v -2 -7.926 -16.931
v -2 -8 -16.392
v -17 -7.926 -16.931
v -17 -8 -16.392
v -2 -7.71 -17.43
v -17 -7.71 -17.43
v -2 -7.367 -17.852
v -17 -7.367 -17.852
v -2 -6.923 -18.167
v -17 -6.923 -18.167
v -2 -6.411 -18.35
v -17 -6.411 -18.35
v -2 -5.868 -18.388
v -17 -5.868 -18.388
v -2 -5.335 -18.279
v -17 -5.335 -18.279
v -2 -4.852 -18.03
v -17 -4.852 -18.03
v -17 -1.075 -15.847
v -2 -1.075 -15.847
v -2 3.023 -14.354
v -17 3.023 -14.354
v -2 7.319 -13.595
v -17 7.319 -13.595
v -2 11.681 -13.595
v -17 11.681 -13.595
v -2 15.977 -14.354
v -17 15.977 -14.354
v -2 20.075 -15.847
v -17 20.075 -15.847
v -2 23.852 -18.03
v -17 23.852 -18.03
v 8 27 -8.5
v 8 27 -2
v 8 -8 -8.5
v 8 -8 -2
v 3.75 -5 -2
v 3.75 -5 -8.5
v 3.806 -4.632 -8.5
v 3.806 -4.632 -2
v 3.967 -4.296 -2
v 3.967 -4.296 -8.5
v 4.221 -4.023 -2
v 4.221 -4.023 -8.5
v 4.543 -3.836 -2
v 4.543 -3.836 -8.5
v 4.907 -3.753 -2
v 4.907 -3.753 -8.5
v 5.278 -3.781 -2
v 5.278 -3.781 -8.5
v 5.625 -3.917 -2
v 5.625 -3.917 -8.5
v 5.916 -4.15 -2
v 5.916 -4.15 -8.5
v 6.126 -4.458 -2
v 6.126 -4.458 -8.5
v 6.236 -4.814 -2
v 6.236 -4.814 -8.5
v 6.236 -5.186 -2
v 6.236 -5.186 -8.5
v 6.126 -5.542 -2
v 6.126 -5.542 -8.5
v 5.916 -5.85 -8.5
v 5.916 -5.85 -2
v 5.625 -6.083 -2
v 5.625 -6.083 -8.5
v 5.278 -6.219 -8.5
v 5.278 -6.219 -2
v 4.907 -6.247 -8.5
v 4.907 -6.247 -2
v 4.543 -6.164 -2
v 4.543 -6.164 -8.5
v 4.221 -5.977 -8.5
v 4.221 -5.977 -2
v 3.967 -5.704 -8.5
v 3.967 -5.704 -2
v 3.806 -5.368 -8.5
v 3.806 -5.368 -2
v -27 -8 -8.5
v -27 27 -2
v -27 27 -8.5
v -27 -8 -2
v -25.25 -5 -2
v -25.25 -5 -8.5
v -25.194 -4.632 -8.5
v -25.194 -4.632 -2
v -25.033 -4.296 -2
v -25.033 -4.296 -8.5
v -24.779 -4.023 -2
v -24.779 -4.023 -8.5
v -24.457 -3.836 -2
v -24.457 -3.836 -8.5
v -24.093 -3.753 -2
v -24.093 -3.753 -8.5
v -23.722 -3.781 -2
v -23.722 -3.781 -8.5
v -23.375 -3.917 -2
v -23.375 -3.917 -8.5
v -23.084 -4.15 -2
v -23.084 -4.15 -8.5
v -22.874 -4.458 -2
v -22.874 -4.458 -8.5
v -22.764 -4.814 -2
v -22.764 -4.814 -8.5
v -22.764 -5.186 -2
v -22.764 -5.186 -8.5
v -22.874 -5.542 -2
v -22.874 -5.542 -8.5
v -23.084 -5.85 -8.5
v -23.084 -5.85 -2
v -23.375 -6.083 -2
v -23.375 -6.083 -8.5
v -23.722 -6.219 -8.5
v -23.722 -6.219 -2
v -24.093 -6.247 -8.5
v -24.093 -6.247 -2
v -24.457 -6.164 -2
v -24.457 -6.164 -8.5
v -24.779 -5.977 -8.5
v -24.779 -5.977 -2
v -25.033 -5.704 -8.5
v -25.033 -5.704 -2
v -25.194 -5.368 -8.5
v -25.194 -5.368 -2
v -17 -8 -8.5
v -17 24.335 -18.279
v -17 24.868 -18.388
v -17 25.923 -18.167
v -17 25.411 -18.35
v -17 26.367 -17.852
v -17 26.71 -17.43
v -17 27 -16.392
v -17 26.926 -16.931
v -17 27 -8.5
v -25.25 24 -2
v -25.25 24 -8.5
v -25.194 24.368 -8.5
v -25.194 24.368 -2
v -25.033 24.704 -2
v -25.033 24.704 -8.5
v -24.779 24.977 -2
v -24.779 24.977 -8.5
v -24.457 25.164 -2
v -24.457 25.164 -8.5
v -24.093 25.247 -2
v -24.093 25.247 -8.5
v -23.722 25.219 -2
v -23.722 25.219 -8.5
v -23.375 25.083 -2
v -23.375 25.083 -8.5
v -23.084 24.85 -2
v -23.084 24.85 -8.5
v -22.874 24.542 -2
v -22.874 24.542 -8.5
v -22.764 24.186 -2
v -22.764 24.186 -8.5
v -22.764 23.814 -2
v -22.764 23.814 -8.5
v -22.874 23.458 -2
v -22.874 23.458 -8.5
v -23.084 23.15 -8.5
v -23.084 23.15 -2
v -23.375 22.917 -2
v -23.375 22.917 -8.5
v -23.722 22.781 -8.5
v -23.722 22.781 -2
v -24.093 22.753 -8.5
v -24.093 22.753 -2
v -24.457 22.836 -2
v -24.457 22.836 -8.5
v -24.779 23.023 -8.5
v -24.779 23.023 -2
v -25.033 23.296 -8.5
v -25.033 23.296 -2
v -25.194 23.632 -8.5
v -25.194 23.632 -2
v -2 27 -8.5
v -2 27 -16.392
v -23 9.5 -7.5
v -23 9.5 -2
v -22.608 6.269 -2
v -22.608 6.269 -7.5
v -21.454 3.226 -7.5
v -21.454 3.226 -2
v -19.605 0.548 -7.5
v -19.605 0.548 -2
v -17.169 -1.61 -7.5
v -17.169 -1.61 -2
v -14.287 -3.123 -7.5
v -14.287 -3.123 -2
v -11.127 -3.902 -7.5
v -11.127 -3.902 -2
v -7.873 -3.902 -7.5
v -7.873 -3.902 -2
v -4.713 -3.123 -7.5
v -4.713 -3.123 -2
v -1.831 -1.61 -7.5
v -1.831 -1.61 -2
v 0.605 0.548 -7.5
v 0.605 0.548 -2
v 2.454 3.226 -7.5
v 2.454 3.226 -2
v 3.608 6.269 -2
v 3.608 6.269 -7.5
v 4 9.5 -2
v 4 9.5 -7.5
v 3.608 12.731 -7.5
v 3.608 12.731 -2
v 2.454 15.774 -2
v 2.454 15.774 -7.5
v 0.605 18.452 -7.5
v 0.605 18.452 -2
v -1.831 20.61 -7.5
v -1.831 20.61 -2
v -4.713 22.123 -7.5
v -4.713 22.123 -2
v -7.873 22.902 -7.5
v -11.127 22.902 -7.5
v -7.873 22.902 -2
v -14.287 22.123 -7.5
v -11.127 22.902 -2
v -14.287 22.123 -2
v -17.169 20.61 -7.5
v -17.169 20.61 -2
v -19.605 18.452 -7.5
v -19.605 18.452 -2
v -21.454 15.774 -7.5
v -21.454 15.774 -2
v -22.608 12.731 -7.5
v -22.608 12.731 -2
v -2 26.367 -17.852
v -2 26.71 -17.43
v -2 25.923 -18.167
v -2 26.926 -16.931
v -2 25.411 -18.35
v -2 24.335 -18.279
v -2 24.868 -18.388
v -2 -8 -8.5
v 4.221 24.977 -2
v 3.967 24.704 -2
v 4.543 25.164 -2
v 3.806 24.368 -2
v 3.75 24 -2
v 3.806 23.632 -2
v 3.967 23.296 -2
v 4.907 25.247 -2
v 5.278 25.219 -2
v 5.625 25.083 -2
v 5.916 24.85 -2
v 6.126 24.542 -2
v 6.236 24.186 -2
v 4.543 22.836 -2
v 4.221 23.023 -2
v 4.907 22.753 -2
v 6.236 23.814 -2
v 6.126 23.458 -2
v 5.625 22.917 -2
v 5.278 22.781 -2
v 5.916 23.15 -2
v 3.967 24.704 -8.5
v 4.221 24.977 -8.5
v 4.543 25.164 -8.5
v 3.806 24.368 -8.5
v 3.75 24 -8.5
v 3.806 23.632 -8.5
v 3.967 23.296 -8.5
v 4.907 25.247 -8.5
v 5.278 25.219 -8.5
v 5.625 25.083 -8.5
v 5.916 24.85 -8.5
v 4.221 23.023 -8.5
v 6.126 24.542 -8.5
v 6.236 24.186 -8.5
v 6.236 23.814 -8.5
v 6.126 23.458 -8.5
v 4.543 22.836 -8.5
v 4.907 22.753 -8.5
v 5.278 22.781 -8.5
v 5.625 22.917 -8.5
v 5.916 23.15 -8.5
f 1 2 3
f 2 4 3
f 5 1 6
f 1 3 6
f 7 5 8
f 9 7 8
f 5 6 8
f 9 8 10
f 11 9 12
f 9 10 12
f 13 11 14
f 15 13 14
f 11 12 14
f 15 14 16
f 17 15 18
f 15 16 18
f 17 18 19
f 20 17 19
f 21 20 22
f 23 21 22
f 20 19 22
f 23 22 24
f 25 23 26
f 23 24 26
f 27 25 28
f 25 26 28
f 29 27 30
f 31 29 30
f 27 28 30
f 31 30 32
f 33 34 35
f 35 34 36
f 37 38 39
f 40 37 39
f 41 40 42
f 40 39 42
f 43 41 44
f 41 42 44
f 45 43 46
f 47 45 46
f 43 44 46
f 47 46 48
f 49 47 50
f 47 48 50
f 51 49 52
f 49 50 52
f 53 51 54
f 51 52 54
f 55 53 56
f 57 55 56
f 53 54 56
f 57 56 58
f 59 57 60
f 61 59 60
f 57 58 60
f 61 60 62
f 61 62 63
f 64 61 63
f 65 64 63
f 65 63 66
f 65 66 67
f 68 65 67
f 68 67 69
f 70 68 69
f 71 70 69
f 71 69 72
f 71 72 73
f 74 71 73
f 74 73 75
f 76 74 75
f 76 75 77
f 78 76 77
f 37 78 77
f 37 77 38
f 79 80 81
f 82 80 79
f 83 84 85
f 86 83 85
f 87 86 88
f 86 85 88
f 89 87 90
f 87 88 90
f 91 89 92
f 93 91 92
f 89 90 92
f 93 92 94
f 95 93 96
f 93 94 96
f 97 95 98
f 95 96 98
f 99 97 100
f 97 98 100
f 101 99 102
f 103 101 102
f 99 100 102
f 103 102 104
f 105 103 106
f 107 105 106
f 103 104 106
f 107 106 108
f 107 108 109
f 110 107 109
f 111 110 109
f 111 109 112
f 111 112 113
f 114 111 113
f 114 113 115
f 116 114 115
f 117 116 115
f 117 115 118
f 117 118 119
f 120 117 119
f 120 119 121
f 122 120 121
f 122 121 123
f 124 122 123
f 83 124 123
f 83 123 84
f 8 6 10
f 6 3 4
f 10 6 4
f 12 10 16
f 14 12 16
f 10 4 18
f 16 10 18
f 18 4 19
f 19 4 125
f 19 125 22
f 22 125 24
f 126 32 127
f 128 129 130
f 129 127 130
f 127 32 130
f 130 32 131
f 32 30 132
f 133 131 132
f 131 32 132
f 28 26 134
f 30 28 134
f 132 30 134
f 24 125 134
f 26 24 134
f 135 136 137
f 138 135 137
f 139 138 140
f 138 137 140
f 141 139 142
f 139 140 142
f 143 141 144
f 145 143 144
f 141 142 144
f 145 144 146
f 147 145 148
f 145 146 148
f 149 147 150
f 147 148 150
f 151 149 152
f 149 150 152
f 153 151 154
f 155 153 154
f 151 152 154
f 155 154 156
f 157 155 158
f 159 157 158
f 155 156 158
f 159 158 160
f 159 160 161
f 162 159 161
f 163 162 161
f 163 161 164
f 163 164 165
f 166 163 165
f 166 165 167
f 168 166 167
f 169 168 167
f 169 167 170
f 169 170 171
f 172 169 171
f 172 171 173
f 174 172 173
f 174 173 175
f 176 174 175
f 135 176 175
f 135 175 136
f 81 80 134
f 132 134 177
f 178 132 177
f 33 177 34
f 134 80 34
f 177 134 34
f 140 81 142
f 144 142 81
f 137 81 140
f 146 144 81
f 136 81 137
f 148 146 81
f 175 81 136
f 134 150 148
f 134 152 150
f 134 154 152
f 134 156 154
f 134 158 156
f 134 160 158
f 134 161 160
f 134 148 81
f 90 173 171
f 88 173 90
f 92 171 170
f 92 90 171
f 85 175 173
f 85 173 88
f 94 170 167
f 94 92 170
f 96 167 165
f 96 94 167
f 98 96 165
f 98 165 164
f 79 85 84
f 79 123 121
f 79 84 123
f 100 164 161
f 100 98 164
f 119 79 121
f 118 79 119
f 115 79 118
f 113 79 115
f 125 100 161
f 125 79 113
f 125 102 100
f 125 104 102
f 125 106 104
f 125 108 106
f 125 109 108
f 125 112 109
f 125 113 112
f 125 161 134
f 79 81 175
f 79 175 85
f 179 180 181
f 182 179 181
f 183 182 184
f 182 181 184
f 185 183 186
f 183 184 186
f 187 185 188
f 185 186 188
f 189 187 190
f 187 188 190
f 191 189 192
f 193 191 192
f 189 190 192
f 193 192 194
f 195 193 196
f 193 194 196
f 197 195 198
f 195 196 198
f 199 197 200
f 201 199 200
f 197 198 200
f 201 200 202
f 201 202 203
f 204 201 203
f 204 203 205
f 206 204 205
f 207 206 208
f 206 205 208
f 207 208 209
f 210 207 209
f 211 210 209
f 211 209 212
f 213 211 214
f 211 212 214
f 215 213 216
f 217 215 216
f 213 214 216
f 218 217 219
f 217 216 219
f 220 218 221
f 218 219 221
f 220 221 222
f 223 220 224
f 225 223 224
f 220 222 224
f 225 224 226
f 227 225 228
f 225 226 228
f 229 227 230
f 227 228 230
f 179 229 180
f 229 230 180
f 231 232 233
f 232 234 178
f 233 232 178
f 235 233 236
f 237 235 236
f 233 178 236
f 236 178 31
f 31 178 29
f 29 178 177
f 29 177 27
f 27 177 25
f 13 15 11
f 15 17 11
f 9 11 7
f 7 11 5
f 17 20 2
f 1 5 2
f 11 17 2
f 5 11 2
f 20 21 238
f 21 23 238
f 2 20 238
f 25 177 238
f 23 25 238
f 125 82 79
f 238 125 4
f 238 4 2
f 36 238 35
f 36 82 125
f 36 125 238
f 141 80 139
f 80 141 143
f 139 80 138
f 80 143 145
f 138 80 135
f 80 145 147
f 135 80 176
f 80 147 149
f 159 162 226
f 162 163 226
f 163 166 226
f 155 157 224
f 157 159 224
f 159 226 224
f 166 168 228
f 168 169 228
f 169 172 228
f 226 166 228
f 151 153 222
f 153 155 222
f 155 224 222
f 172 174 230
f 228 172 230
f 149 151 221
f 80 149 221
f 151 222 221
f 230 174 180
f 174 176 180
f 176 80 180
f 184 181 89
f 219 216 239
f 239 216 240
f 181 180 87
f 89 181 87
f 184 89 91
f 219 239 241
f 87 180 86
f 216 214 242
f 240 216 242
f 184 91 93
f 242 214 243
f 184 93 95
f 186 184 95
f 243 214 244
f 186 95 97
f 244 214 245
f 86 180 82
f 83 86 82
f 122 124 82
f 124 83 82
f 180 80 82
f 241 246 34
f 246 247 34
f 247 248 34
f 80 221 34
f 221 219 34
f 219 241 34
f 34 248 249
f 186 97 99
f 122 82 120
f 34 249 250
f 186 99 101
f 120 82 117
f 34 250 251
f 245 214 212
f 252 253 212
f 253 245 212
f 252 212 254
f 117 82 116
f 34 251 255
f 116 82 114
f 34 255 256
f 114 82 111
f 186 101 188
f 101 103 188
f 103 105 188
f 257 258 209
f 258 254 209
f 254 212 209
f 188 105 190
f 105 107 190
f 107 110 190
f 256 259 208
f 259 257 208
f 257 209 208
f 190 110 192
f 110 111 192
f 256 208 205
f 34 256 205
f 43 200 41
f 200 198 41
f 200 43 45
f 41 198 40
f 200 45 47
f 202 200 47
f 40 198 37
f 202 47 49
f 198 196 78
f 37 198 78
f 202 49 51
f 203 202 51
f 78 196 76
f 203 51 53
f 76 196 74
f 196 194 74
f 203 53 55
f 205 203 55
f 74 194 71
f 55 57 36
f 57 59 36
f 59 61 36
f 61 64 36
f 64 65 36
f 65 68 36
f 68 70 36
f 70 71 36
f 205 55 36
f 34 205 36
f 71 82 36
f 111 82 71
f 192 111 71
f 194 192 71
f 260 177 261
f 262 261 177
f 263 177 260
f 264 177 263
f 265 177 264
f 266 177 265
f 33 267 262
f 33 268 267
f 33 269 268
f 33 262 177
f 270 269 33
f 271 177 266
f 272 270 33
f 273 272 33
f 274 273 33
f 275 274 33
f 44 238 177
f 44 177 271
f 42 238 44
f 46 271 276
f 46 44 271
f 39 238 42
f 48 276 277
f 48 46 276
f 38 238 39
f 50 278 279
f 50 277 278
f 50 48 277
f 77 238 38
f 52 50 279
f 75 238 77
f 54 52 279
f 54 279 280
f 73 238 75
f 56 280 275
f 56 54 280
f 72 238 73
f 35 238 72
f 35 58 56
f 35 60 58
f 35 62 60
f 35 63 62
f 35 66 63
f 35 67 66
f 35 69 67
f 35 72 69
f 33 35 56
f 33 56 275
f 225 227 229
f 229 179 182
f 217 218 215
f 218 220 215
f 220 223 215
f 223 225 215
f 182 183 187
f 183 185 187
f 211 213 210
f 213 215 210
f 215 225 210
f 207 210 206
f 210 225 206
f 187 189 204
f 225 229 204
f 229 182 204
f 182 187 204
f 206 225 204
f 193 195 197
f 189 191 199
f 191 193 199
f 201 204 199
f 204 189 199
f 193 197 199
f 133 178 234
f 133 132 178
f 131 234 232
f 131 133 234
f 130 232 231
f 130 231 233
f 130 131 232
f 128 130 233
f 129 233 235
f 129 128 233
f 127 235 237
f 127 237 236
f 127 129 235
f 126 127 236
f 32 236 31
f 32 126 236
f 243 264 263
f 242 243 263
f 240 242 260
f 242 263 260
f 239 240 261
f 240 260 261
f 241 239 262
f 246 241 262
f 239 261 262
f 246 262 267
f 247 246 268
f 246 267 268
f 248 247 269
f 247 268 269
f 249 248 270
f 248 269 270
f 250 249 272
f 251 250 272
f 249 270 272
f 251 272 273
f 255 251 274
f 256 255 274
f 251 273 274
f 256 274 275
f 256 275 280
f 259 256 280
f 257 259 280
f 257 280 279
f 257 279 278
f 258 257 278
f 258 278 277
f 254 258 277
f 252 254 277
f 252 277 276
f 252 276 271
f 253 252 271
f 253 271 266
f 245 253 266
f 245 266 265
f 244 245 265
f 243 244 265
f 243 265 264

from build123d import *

# Parameters (mm, degrees)
F0_W       = 35
F0_H       = 35
F0_W_2     = 23
F0_H_2     = 23
F1_DEPTH   = 2
F3_DEPTH   = 5.5
F4_DEPTH   = 2.5
F5_DEPTH   = 1
F7_W       = 35
F7_H       = 35
F7_R       = 13.5
F8_DEPTH   = 1
F9_D       = 2.5
F9_DEPTH   = 10
F9_TIP     = 0.7510757738
F9_2_D     = 2.5
F9_2_DEPTH = 10
F9_2_TIP   = 0.7510757738
F10_W      = 7.5
F10_H      = 17.5
F11_DEPTH  = 25
F12_R      = 25
F13_DEPTH  = 25
F14_R      = 2


with BuildPart() as f1:
    # F0 (on Top) → F1 (new body)
    with BuildSketch(Plane.XY):
        with Locations((-9.5, 9.5)):
            Rectangle(F0_W, F0_H)
        with Locations((-9.5, 9.5)):
            Rectangle(F0_W_2, F0_H_2, mode=Mode.SUBTRACT)
        with Locations((-9.5, 9.5)):
            Rectangle(F0_W_2, F0_H_2)
        with BuildLine():
            Line((0, 5.027864045), (0, 0))
            Line((0, 0), (-5.027864045, 0))
            ThreePointArc((-5.027864045, 0), (-9.5, -1), (-13.972135955, 0))
            Line((-13.972135955, 0), (-19, 0))
            Line((-19, 0), (-19, 5.027864045))
            ThreePointArc((-19, 5.027864045), (-20, 9.5), (-19, 13.972135955))
            Line((-19, 13.972135955), (-19, 19))
            Line((-19, 19), (-13.972135955, 19))
            ThreePointArc((-13.972135955, 19), (-9.5, 20), (-5.027864045, 19))
            Line((-5.027864045, 19), (0, 19))
            Line((0, 19), (0, 13.972135955))
            ThreePointArc((0, 13.972135955), (0.746950766, 11.7912878475), (1, 9.5))
            ThreePointArc((1, 9.5), (0.746950766, 7.2087121525), (0, 5.027864045))
        make_face(mode=Mode.SUBTRACT)
        with BuildLine():
            Line((-13.972135955, 0), (-5.027864045, 0))
            ThreePointArc((-5.027864045, 0), (-2.0753787975, 2.0753787975), (0, 5.027864045))
            Line((0, 5.027864045), (0, 13.972135955))
            ThreePointArc((0, 13.972135955), (-2.0753787975, 16.9246212025), (-5.027864045, 19))
            Line((-5.027864045, 19), (-13.972135955, 19))
            ThreePointArc((-13.972135955, 19), (-16.9246212025, 16.9246212025), (-19, 13.972135955))
            Line((-19, 13.972135955), (-19, 5.027864045))
            ThreePointArc((-19, 5.027864045), (-16.9246212025, 2.0753787975), (-13.972135955, 0))
        make_face()
        with BuildLine():
            Line((-19, 19), (-19, 13.972135955))
            ThreePointArc((-19, 13.972135955), (-16.9246212025, 16.9246212025), (-13.972135955, 19))
            Line((-13.972135955, 19), (-19, 19))
        make_face()
        with BuildLine():
            ThreePointArc((-5.027864045, 19), (-2.0753787975, 16.9246212025), (0, 13.972135955))
            Line((0, 13.972135955), (0, 19))
            Line((0, 19), (-5.027864045, 19))
        make_face()
        with BuildLine():
            Line((-5.027864045, 0), (0, 0))
            Line((0, 0), (0, 5.027864045))
            ThreePointArc((0, 5.027864045), (-2.0753787975, 2.0753787975), (-5.027864045, 0))
        make_face()
        with BuildLine():
            Line((-19, 0), (-13.972135955, 0))
            ThreePointArc((-13.972135955, 0), (-16.9246212025, 2.0753787975), (-19, 5.027864045))
            Line((-19, 5.027864045), (-19, 0))
        make_face()
        with BuildLine():
            Line((0, 13.972135955), (0, 5.027864045))
            ThreePointArc((0, 5.027864045), (0.746950766, 7.2087121525), (1, 9.5))
            ThreePointArc((1, 9.5), (0.746950766, 11.7912878475), (0, 13.972135955))
        make_face()
        with BuildLine():
            ThreePointArc((-13.972135955, 0), (-9.5, -1), (-5.027864045, 0))
            Line((-5.027864045, 0), (-13.972135955, 0))
        make_face()
        with BuildLine():
            ThreePointArc((-19, 13.972135955), (-20, 9.5), (-19, 5.027864045))
            Line((-19, 5.027864045), (-19, 13.972135955))
        make_face()
        with BuildLine():
            Line((-13.972135955, 19), (-5.027864045, 19))
            ThreePointArc((-5.027864045, 19), (-9.5, 20), (-13.972135955, 19))
        make_face()
    extrude(amount=-F1_DEPTH)

    # F0 (on Top) → F4 (join)
    with BuildSketch(Plane.XY):
        with Locations((-9.5, 9.5)):
            Rectangle(F0_W_2, F0_H_2)
        with BuildLine():
            Line((0, 5.027864045), (0, 0))
            Line((0, 0), (-5.027864045, 0))
            ThreePointArc((-5.027864045, 0), (-9.5, -1), (-13.972135955, 0))
            Line((-13.972135955, 0), (-19, 0))
            Line((-19, 0), (-19, 5.027864045))
            ThreePointArc((-19, 5.027864045), (-20, 9.5), (-19, 13.972135955))
            Line((-19, 13.972135955), (-19, 19))
            Line((-19, 19), (-13.972135955, 19))
            ThreePointArc((-13.972135955, 19), (-9.5, 20), (-5.027864045, 19))
            Line((-5.027864045, 19), (0, 19))
            Line((0, 19), (0, 13.972135955))
            ThreePointArc((0, 13.972135955), (0.746950766, 11.7912878475), (1, 9.5))
            ThreePointArc((1, 9.5), (0.746950766, 7.2087121525), (0, 5.027864045))
        make_face(mode=Mode.SUBTRACT)
        with BuildLine():
            ThreePointArc((-19, 13.972135955), (-20, 9.5), (-19, 5.027864045))
            Line((-19, 5.027864045), (-19, 13.972135955))
        make_face()
        with BuildLine():
            Line((-13.972135955, 19), (-5.027864045, 19))
            ThreePointArc((-5.027864045, 19), (-9.5, 20), (-13.972135955, 19))
        make_face()
        with BuildLine():
            Line((0, 13.972135955), (0, 5.027864045))
            ThreePointArc((0, 5.027864045), (0.746950766, 7.2087121525), (1, 9.5))
            ThreePointArc((1, 9.5), (0.746950766, 11.7912878475), (0, 13.972135955))
        make_face()
        with BuildLine():
            ThreePointArc((-13.972135955, 0), (-9.5, -1), (-5.027864045, 0))
            Line((-5.027864045, 0), (-13.972135955, 0))
        make_face()
    extrude(amount=F4_DEPTH)


with BuildPart() as f3:
    # F2 (on face) → F3 (new body)
    with BuildSketch(Plane(origin=(0, 0, -2), x_dir=(1, 0, 0), z_dir=(0, 0, -1))):
        with BuildLine():
            Line((-27, -9.5), (-27, -27))
            Line((-27, -27), (8, -27))
            Line((8, -27), (8, -9.5))
            Line((8, -9.5), (4, -9.5))
            ThreePointArc((4, -9.5), (-9.5, -23), (-23, -9.5))
            Line((-23, -9.5), (-27, -9.5))
        make_face()
        with BuildLine():
            Line((-27, 8), (-27, -9.5))
            Line((-27, -9.5), (-23, -9.5))
            ThreePointArc((-23, -9.5), (-9.5, 4), (4, -9.5))
            Line((4, -9.5), (8, -9.5))
            Line((8, -9.5), (8, 8))
            Line((8, 8), (-27, 8))
        make_face()
    extrude(amount=F3_DEPTH)


with BuildPart() as f5:
    # F5 (new): a face of the model
    f5_faces = [f3.part.faces().sort_by_distance(p)[0] for p in [
        (-9.5, 26.5050252532, -7.5),
    ]]
    extrude(f5_faces, amount=F5_DEPTH)


with BuildPart() as f5b:
    # F5#2 (new): a face of the model
    f5_2_faces = [f1.part.faces().sort_by_distance(p)[0] for p in [
        (-9.5, 9.5, -2),
    ]]
    extrude(f5_2_faces, amount=F5_DEPTH)


with BuildPart() as f3_1:
    add(f3.part)

    # F7 (on face) → F8 (join)
    with BuildSketch(Plane(origin=(0, 0, -7.5), x_dir=(1, 0, 0), z_dir=(0, 0, -1))):
        with Locations((-9.5, -9.5)):
            Rectangle(F7_W, F7_H)
        with Locations((-9.5, -9.5)):
            Circle(F7_R, mode=Mode.SUBTRACT)
        with Locations((-9.5, -9.5)):
            Circle(F7_R)
    extrude(amount=F8_DEPTH)

    # F9#2
    with Locations(Plane.XY):
        with Locations((-24, -5), (-24, 24), (5, 24), (5, -5)):
            Hole(F9_2_D / 2, depth=F9_2_DEPTH)
            with Locations((0, 0, -(F9_2_DEPTH + F9_2_TIP / 2))):  # 118° drill point
                Cone(0, F9_2_D / 2, F9_2_TIP, mode=Mode.SUBTRACT)

    # F10 (on face) → F11 (join)
    with BuildSketch(Plane(origin=(0, 0, -8.5), x_dir=(1, 0, 0), z_dir=(0, 0, -1))):
        with Locations((-13.25, -0.75)):
            Rectangle(F10_W, F10_H)
        with Locations((-13.25, -18.25)):
            Rectangle(F10_W, F10_H)
        Polygon((-2, 8), (-9.5, 8), (-9.5, -9.5), (-9.5, -27), (-2, -27), (-2, -9.5), align=None)
    extrude(amount=F11_DEPTH)

    # F12 (on face) → F13 (cut)
    with BuildSketch(Plane(origin=(-17, 0, 0), x_dir=(0, -1, 0), z_dir=(-1, 0, 0))):
        with Locations((-9.5, -38.5)):
            Circle(F12_R)
    extrude(amount=-F13_DEPTH, mode=Mode.SUBTRACT)

    # F14
    f14_edges = [f3_1.edges().sort_by_distance(p)[0] for p in [
        (-9.5, -8, -20.646429),
        (-9.5, 27, -20.646429),
    ]]
    fillet(f14_edges, radius=F14_R)


with BuildPart() as f1_1:
    add(f1.part)

    # F9
    with Locations(Plane.XY):
        with Locations((-24, -5), (-24, 24), (5, 24), (5, -5)):
            Hole(F9_D / 2, depth=F9_DEPTH)
            with Locations((0, 0, -(F9_DEPTH + F9_TIP / 2))):  # 118° drill point
                Cone(0, F9_D / 2, F9_TIP, mode=Mode.SUBTRACT)


solid = f3_1.part
